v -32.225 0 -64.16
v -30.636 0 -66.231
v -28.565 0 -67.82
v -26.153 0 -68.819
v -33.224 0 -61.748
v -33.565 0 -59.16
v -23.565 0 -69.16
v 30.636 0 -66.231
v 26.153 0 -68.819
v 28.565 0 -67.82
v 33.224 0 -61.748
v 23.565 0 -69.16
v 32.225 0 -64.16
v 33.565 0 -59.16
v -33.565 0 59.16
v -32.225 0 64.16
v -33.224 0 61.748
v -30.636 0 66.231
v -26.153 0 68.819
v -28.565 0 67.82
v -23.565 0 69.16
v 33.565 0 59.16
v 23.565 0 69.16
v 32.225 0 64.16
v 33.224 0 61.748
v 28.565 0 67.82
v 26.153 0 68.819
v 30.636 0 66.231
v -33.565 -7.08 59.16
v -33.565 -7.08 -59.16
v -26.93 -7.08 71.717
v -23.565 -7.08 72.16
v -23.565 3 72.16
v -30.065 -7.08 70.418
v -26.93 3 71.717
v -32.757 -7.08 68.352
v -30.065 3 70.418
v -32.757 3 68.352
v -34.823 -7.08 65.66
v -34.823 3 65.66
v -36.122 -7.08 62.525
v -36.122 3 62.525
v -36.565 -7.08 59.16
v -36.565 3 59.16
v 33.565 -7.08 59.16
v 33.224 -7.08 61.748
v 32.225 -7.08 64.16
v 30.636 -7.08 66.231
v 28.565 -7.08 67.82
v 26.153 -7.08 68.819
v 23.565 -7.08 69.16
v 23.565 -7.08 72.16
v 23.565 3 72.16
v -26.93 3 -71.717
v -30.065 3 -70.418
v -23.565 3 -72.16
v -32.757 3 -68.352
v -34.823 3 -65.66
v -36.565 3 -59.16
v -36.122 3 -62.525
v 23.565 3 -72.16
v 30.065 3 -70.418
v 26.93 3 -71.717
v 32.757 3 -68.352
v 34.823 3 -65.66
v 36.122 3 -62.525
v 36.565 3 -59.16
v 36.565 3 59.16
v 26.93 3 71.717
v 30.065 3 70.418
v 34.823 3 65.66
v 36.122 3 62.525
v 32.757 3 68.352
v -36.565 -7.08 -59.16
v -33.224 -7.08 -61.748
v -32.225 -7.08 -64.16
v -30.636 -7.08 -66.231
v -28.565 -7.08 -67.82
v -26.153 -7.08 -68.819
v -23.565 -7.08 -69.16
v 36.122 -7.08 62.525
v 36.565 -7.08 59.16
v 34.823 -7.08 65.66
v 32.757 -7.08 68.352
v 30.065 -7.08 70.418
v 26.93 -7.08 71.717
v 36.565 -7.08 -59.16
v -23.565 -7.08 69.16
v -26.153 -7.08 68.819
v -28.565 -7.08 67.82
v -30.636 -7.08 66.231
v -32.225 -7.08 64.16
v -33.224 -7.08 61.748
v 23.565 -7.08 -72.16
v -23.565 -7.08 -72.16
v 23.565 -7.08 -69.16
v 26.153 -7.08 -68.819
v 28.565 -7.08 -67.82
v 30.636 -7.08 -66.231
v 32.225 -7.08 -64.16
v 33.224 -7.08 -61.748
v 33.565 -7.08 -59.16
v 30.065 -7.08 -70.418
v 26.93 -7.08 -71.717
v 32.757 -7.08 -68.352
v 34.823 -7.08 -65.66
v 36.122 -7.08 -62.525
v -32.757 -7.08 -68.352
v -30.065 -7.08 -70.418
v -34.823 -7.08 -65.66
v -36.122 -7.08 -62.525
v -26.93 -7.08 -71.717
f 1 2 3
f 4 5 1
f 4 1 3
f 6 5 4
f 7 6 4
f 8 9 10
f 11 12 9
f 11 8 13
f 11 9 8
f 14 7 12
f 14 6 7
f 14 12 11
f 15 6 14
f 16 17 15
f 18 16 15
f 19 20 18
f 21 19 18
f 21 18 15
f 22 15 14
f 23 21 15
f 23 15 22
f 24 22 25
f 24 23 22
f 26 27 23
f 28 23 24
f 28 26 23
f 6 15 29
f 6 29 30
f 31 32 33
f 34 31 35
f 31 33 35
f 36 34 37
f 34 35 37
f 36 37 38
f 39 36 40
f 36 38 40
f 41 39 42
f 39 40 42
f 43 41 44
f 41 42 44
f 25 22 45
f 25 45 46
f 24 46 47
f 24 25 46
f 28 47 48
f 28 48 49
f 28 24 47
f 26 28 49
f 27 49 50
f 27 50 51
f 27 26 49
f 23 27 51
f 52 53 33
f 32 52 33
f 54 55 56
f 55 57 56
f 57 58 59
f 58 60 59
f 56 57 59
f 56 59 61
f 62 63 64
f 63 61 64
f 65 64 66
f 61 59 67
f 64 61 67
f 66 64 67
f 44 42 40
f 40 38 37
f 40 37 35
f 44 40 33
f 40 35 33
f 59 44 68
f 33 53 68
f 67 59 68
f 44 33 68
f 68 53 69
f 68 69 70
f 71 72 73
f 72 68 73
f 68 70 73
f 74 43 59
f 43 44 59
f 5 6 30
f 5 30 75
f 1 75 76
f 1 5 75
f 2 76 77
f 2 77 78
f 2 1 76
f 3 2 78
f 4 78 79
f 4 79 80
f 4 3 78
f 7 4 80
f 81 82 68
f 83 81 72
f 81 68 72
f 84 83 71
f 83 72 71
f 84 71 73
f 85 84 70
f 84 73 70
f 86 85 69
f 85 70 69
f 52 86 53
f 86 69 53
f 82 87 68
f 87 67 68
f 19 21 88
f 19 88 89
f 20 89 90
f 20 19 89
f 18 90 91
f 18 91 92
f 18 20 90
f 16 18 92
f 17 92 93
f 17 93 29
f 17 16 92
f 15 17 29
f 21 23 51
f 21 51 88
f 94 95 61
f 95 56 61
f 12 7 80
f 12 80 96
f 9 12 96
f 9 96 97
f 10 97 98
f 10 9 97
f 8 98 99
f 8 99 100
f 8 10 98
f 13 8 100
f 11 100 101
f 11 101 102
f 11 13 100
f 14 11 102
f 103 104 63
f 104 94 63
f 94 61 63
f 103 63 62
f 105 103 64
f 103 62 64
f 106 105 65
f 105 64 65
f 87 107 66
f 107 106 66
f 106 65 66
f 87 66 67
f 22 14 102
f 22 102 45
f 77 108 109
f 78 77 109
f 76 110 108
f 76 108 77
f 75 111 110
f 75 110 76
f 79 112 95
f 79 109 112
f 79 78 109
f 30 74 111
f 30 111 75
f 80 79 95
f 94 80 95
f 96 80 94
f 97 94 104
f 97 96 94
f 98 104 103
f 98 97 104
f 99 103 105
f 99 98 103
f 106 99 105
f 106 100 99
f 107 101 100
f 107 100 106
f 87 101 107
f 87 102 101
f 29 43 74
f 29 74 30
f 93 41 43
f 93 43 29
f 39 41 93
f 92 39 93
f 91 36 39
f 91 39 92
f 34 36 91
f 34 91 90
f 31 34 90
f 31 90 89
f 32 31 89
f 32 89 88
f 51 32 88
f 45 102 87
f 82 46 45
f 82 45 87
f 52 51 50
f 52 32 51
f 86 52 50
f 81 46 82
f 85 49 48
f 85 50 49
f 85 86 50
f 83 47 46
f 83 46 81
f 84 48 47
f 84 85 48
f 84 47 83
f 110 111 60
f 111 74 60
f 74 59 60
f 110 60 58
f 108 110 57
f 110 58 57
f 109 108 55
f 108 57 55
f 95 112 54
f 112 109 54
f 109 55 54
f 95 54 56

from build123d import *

# Parameters (mm, degrees)
F0_R     = 4.69
F0_W     = 58.73
F0_H     = 103.15
F0_R_2   = 2.195
F0_R_3   = 1.058193308
F0_R_4   = 5.3501775611
F1_DEPTH = 7.08
F2_DEPTH = 7.08
F4_DEPTH = 0.8
F5_T     = 3


# Not quite as in the source:
# - a feature of the source that left no trace in its solid (it failed there, or was rolled back) is left out


with BuildPart() as f1:
    # F0 (on Front) → F1 (new body)
    with BuildSketch(Plane.XZ):
        with BuildLine():
            Line((23.565, 69.16), (-23.565, 69.16))
            ThreePointArc((-23.565, 69.16), (-30.6360678119, 66.2310678119), (-33.565, 59.16))
            Line((-33.565, 59.16), (-33.565, -59.16))
            ThreePointArc((-33.565, -59.16), (-30.6360678119, -66.2310678119), (-23.565, -69.16))
            Line((-23.565, -69.16), (23.565, -69.16))
            ThreePointArc((23.565, -69.16), (30.6360678119, -66.2310678119), (33.565, -59.16))
            Line((33.565, -59.16), (33.565, 59.16))
            ThreePointArc((33.565, 59.16), (30.6360678119, 66.2310678119), (23.565, 69.16))
        make_face()
        with Locations((0, -60.0285455585)):
            Circle(F0_R, mode=Mode.SUBTRACT)
        Rectangle(F0_W, F0_H, mode=Mode.SUBTRACT)
        with Locations((10.2654388174, 59.16)):
            Circle(F0_R_2, mode=Mode.SUBTRACT)
        with Locations((14.2954164479, 59.1465724891)):
            Circle(F0_R_3, mode=Mode.SUBTRACT)
        with Locations((21.3369000703, 59.16)):
            Circle(F0_R_4, mode=Mode.SUBTRACT)
        Rectangle(F0_W, F0_H)
        with Locations((21.3369000703, 59.16)):
            Circle(F0_R_4)
        with Locations((0, -60.0285455585)):
            Circle(F0_R)
        with Locations((10.2654388174, 59.16)):
            Circle(F0_R_2)
        with Locations((14.2954164479, 59.1465724891)):
            Circle(F0_R_3)
    extrude(amount=F1_DEPTH)

    # F0 (on Front) → F2 (join)
    with BuildSketch(Plane.XZ):
        Rectangle(F0_W, F0_H)
        with Locations((0, -60.0285455585)):
            Circle(F0_R)
    extrude(amount=F2_DEPTH)

    # F0 (on Front) → F4 (join)
    with BuildSketch(Plane.XZ):
        with Locations((21.3369000703, 59.16)):
            Circle(F0_R_4)
    extrude(amount=F4_DEPTH)

    # F5
    f5_openings = [f1.faces().sort_by_distance(p)[0] for p in [
        (0, -7.08, 0),
    ]]
    offset(amount=F5_T, openings=f5_openings, kind=Kind.INTERSECTION)


solid = f1.part
